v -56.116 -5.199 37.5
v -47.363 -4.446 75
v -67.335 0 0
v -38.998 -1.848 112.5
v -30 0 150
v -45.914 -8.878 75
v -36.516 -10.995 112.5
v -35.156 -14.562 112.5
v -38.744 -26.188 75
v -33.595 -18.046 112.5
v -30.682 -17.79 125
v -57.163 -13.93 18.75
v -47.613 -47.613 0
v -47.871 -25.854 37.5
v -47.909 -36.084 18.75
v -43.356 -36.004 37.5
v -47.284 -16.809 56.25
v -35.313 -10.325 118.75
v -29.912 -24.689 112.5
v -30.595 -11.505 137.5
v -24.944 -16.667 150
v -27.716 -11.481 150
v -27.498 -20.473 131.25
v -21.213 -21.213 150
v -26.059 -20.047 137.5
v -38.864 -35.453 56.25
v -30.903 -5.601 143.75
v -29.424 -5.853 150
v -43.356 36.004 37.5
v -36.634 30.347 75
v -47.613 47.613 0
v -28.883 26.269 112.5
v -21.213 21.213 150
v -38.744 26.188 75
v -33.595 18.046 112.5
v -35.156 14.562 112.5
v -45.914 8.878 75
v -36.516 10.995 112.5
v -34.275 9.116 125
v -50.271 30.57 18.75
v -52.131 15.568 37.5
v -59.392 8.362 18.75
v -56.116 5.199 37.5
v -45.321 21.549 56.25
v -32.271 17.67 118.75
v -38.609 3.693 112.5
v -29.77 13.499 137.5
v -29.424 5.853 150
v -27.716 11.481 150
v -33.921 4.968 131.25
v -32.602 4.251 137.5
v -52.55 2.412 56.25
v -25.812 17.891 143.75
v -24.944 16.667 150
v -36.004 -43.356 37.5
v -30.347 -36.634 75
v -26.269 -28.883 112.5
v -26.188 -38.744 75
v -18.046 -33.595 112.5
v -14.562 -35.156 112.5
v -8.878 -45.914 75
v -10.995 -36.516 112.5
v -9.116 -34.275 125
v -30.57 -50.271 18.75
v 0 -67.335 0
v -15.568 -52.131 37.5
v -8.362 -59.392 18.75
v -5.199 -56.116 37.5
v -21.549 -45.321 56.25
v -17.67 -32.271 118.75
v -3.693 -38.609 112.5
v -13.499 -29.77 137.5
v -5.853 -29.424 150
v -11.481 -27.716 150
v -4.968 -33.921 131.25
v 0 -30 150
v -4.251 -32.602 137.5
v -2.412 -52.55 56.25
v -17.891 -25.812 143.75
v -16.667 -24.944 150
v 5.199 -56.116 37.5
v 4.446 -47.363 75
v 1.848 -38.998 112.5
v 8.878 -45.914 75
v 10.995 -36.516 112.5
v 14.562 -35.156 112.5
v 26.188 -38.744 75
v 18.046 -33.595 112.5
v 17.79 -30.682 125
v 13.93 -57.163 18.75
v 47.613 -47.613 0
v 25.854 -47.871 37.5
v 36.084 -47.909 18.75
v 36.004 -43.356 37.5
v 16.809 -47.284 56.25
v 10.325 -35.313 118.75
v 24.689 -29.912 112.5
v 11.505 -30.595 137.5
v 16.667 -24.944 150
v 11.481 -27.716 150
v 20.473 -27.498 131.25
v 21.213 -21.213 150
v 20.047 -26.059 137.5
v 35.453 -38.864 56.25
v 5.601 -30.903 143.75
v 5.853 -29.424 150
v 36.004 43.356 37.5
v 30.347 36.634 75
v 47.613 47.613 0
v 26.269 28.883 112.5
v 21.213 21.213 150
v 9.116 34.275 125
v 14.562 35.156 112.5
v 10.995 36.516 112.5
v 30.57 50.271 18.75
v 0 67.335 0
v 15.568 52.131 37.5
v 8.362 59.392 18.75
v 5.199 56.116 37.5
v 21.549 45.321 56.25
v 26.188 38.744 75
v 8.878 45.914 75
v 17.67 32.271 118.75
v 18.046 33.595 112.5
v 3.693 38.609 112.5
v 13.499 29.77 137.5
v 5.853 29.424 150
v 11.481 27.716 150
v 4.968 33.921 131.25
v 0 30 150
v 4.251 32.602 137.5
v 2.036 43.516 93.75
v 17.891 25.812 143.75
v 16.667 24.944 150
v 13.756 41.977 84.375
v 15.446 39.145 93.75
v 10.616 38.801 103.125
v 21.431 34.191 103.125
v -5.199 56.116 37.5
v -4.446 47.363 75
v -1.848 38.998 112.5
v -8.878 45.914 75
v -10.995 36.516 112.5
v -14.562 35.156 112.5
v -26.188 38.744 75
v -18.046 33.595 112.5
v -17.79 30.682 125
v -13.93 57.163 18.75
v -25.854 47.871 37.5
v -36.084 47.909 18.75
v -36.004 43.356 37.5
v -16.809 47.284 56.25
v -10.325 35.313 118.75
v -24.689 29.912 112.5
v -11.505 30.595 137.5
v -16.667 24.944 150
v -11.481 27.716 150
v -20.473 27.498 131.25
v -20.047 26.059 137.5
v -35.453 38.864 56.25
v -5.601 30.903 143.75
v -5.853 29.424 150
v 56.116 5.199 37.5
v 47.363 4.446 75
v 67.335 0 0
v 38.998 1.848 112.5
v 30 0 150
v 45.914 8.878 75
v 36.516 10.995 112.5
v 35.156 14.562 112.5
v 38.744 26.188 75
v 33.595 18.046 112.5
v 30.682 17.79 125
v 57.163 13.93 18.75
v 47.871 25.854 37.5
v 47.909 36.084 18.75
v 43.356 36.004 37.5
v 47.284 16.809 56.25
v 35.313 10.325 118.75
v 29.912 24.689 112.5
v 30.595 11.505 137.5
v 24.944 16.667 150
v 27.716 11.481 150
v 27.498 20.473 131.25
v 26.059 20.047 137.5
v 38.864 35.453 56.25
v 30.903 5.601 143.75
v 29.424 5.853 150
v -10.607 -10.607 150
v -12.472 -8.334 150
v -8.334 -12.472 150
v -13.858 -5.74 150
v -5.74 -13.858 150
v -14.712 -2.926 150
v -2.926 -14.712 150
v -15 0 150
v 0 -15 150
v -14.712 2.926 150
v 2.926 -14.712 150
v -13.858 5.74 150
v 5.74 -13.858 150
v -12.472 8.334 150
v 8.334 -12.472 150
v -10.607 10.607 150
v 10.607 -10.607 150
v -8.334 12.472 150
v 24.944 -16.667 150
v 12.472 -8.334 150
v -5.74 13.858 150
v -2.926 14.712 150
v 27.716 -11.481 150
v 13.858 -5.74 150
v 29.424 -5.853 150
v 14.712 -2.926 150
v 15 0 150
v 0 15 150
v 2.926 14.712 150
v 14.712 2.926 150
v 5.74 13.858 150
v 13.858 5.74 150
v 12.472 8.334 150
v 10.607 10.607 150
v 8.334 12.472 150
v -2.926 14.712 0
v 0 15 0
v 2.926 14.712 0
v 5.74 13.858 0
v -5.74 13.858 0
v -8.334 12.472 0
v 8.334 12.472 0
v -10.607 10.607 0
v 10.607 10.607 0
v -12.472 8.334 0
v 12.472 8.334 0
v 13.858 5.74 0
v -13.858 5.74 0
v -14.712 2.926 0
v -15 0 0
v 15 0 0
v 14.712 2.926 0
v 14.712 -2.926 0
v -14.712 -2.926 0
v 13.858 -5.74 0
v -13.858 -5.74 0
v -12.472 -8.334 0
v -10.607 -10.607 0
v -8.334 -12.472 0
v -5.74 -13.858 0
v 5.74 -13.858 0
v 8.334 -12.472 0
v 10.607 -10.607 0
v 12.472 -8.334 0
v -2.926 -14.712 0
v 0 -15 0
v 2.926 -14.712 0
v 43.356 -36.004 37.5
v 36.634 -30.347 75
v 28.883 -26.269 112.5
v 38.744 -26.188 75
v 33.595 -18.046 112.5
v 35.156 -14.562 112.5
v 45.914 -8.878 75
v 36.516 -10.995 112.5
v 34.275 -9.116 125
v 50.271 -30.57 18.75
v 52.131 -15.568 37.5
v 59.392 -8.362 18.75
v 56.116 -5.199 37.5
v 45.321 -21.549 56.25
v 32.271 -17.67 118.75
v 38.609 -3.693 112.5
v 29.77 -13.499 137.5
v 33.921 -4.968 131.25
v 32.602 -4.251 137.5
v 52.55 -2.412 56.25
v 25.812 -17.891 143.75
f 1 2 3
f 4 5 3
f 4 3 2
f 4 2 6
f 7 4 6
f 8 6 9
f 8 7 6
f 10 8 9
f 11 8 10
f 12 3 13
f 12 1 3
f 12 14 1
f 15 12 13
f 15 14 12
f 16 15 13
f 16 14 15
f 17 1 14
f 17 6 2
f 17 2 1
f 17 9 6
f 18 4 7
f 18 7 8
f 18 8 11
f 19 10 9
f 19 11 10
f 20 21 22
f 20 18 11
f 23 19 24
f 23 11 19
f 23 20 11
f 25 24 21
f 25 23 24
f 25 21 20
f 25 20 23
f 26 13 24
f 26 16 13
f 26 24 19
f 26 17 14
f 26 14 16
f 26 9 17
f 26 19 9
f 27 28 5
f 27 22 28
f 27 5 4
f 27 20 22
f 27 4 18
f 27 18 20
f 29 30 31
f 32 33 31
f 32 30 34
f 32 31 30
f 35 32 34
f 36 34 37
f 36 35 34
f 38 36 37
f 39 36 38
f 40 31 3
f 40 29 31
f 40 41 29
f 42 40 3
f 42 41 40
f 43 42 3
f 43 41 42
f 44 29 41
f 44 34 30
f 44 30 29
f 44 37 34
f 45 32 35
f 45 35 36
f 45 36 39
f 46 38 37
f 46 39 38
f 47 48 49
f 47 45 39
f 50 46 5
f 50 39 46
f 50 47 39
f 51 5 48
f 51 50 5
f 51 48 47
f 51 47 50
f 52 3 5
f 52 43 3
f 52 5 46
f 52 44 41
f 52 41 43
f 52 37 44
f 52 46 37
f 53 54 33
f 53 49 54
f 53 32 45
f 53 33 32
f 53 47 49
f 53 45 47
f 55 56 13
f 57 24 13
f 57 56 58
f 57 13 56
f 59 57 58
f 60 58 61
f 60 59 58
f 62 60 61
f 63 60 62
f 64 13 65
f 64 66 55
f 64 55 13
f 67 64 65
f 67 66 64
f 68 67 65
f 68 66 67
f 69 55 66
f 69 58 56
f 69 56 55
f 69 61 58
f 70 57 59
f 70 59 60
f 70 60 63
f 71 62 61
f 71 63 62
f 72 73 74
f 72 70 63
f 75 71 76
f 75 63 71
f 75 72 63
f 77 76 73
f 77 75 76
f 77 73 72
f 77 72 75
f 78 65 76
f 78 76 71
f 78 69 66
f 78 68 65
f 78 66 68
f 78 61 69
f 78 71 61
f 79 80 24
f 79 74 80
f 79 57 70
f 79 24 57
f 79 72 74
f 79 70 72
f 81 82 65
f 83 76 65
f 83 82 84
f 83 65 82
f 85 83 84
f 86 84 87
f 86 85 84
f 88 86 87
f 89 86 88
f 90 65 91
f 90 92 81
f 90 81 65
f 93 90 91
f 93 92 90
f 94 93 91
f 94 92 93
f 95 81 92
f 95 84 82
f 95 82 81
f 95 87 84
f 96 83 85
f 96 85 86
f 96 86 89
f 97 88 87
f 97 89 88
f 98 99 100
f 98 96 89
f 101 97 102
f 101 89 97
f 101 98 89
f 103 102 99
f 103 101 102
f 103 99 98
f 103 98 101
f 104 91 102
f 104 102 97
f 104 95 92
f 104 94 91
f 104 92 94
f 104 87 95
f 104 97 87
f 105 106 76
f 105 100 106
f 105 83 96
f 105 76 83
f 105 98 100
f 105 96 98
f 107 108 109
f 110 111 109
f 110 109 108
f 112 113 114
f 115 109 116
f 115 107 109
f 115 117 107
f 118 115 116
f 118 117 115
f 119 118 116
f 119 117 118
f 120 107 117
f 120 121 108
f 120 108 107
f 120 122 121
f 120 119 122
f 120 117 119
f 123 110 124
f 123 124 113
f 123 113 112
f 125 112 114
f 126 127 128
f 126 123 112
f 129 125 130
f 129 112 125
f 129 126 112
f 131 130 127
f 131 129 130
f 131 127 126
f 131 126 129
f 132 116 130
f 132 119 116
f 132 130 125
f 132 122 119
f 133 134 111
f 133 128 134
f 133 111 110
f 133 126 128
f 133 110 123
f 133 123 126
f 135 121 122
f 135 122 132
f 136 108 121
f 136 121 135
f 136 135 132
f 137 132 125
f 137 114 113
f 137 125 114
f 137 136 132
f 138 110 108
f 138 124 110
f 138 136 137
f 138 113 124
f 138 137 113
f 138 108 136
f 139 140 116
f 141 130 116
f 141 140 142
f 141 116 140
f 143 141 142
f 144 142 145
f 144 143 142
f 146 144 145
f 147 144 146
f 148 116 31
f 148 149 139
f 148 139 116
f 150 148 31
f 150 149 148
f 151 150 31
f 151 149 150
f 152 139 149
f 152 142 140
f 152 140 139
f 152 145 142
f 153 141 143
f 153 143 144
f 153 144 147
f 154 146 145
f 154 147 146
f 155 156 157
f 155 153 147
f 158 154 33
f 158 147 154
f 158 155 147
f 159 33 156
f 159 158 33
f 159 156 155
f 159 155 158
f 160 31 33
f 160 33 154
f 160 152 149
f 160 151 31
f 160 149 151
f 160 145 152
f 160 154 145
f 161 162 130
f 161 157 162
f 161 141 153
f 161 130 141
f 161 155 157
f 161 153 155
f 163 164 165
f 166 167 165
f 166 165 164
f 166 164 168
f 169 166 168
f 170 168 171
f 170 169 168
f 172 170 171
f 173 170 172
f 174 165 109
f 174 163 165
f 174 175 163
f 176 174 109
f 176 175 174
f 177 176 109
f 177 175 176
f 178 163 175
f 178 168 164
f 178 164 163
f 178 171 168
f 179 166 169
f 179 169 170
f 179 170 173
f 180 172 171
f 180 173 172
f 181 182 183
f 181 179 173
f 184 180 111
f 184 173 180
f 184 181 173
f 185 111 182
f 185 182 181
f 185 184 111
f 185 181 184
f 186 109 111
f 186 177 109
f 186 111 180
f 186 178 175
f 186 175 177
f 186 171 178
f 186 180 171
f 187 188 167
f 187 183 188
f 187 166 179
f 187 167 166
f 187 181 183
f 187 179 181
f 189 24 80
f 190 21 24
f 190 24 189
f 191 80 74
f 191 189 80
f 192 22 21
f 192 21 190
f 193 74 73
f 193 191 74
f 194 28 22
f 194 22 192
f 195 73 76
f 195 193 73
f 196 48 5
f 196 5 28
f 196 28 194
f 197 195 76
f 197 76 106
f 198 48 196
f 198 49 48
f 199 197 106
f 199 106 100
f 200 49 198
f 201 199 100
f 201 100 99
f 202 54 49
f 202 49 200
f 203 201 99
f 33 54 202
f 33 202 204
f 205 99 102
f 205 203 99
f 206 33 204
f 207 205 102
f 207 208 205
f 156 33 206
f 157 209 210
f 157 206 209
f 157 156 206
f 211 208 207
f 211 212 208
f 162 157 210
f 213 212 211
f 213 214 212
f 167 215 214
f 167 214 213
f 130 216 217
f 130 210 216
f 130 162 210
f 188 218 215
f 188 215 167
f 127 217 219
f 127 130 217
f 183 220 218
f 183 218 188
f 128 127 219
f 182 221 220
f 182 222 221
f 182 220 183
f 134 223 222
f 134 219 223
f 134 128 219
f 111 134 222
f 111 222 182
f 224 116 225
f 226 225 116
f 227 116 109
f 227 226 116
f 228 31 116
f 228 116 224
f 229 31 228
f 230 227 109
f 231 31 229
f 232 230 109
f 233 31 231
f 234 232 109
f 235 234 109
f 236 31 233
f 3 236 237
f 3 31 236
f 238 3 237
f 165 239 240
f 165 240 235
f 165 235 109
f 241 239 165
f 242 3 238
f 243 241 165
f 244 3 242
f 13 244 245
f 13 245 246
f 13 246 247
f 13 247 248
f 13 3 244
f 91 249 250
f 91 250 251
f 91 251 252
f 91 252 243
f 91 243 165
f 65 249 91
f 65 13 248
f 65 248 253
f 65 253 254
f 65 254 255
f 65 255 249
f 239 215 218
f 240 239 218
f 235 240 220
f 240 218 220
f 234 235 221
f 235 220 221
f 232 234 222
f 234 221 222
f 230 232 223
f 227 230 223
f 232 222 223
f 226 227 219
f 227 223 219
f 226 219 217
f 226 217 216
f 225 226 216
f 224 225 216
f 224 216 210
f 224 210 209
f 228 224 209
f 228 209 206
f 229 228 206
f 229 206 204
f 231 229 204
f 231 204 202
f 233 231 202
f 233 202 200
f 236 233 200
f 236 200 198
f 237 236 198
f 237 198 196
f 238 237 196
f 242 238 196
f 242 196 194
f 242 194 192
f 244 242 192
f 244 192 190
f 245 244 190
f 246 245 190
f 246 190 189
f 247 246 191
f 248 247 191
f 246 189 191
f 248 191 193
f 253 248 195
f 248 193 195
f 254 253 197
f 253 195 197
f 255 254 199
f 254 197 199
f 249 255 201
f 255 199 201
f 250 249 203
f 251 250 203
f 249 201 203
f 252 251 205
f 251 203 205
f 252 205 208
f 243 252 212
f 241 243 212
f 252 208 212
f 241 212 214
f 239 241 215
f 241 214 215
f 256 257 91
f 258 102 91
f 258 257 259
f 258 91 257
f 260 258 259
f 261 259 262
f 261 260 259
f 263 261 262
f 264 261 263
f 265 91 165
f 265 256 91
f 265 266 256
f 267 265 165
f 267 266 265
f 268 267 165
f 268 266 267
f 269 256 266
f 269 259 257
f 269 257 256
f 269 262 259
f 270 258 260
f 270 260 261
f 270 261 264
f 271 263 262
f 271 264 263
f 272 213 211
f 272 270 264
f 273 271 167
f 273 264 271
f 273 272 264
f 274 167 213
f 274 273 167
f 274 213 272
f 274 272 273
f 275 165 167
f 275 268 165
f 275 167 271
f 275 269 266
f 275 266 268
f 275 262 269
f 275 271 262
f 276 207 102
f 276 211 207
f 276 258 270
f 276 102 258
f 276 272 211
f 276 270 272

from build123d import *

# Parameters (mm, degrees)
F2_R     = 30
F4_R     = 15
F5_DEPTH = 226.1


with BuildPart() as f3:
    # F0 (on Top) → F3 section 0
    with BuildSketch(Plane.XY):
        Polygon((-47.612937, 47.612937), (-67.334861, 0), (-47.612937, -47.612937), (0, -67.334861), (47.612937, -47.612937), (67.334861, 0), (47.612937, 47.612937), (0, 67.334861), align=None)
    # F2 (on offset) → F3 section 1
    with BuildSketch(Plane.XY.offset(150)):
        Circle(F2_R)
    loft()

    # F4 (on offset) → F5 (cut)
    with BuildSketch(Plane.XY.offset(150)):
        Circle(F4_R)
    extrude(amount=-F5_DEPTH, mode=Mode.SUBTRACT)


solid = f3.part
